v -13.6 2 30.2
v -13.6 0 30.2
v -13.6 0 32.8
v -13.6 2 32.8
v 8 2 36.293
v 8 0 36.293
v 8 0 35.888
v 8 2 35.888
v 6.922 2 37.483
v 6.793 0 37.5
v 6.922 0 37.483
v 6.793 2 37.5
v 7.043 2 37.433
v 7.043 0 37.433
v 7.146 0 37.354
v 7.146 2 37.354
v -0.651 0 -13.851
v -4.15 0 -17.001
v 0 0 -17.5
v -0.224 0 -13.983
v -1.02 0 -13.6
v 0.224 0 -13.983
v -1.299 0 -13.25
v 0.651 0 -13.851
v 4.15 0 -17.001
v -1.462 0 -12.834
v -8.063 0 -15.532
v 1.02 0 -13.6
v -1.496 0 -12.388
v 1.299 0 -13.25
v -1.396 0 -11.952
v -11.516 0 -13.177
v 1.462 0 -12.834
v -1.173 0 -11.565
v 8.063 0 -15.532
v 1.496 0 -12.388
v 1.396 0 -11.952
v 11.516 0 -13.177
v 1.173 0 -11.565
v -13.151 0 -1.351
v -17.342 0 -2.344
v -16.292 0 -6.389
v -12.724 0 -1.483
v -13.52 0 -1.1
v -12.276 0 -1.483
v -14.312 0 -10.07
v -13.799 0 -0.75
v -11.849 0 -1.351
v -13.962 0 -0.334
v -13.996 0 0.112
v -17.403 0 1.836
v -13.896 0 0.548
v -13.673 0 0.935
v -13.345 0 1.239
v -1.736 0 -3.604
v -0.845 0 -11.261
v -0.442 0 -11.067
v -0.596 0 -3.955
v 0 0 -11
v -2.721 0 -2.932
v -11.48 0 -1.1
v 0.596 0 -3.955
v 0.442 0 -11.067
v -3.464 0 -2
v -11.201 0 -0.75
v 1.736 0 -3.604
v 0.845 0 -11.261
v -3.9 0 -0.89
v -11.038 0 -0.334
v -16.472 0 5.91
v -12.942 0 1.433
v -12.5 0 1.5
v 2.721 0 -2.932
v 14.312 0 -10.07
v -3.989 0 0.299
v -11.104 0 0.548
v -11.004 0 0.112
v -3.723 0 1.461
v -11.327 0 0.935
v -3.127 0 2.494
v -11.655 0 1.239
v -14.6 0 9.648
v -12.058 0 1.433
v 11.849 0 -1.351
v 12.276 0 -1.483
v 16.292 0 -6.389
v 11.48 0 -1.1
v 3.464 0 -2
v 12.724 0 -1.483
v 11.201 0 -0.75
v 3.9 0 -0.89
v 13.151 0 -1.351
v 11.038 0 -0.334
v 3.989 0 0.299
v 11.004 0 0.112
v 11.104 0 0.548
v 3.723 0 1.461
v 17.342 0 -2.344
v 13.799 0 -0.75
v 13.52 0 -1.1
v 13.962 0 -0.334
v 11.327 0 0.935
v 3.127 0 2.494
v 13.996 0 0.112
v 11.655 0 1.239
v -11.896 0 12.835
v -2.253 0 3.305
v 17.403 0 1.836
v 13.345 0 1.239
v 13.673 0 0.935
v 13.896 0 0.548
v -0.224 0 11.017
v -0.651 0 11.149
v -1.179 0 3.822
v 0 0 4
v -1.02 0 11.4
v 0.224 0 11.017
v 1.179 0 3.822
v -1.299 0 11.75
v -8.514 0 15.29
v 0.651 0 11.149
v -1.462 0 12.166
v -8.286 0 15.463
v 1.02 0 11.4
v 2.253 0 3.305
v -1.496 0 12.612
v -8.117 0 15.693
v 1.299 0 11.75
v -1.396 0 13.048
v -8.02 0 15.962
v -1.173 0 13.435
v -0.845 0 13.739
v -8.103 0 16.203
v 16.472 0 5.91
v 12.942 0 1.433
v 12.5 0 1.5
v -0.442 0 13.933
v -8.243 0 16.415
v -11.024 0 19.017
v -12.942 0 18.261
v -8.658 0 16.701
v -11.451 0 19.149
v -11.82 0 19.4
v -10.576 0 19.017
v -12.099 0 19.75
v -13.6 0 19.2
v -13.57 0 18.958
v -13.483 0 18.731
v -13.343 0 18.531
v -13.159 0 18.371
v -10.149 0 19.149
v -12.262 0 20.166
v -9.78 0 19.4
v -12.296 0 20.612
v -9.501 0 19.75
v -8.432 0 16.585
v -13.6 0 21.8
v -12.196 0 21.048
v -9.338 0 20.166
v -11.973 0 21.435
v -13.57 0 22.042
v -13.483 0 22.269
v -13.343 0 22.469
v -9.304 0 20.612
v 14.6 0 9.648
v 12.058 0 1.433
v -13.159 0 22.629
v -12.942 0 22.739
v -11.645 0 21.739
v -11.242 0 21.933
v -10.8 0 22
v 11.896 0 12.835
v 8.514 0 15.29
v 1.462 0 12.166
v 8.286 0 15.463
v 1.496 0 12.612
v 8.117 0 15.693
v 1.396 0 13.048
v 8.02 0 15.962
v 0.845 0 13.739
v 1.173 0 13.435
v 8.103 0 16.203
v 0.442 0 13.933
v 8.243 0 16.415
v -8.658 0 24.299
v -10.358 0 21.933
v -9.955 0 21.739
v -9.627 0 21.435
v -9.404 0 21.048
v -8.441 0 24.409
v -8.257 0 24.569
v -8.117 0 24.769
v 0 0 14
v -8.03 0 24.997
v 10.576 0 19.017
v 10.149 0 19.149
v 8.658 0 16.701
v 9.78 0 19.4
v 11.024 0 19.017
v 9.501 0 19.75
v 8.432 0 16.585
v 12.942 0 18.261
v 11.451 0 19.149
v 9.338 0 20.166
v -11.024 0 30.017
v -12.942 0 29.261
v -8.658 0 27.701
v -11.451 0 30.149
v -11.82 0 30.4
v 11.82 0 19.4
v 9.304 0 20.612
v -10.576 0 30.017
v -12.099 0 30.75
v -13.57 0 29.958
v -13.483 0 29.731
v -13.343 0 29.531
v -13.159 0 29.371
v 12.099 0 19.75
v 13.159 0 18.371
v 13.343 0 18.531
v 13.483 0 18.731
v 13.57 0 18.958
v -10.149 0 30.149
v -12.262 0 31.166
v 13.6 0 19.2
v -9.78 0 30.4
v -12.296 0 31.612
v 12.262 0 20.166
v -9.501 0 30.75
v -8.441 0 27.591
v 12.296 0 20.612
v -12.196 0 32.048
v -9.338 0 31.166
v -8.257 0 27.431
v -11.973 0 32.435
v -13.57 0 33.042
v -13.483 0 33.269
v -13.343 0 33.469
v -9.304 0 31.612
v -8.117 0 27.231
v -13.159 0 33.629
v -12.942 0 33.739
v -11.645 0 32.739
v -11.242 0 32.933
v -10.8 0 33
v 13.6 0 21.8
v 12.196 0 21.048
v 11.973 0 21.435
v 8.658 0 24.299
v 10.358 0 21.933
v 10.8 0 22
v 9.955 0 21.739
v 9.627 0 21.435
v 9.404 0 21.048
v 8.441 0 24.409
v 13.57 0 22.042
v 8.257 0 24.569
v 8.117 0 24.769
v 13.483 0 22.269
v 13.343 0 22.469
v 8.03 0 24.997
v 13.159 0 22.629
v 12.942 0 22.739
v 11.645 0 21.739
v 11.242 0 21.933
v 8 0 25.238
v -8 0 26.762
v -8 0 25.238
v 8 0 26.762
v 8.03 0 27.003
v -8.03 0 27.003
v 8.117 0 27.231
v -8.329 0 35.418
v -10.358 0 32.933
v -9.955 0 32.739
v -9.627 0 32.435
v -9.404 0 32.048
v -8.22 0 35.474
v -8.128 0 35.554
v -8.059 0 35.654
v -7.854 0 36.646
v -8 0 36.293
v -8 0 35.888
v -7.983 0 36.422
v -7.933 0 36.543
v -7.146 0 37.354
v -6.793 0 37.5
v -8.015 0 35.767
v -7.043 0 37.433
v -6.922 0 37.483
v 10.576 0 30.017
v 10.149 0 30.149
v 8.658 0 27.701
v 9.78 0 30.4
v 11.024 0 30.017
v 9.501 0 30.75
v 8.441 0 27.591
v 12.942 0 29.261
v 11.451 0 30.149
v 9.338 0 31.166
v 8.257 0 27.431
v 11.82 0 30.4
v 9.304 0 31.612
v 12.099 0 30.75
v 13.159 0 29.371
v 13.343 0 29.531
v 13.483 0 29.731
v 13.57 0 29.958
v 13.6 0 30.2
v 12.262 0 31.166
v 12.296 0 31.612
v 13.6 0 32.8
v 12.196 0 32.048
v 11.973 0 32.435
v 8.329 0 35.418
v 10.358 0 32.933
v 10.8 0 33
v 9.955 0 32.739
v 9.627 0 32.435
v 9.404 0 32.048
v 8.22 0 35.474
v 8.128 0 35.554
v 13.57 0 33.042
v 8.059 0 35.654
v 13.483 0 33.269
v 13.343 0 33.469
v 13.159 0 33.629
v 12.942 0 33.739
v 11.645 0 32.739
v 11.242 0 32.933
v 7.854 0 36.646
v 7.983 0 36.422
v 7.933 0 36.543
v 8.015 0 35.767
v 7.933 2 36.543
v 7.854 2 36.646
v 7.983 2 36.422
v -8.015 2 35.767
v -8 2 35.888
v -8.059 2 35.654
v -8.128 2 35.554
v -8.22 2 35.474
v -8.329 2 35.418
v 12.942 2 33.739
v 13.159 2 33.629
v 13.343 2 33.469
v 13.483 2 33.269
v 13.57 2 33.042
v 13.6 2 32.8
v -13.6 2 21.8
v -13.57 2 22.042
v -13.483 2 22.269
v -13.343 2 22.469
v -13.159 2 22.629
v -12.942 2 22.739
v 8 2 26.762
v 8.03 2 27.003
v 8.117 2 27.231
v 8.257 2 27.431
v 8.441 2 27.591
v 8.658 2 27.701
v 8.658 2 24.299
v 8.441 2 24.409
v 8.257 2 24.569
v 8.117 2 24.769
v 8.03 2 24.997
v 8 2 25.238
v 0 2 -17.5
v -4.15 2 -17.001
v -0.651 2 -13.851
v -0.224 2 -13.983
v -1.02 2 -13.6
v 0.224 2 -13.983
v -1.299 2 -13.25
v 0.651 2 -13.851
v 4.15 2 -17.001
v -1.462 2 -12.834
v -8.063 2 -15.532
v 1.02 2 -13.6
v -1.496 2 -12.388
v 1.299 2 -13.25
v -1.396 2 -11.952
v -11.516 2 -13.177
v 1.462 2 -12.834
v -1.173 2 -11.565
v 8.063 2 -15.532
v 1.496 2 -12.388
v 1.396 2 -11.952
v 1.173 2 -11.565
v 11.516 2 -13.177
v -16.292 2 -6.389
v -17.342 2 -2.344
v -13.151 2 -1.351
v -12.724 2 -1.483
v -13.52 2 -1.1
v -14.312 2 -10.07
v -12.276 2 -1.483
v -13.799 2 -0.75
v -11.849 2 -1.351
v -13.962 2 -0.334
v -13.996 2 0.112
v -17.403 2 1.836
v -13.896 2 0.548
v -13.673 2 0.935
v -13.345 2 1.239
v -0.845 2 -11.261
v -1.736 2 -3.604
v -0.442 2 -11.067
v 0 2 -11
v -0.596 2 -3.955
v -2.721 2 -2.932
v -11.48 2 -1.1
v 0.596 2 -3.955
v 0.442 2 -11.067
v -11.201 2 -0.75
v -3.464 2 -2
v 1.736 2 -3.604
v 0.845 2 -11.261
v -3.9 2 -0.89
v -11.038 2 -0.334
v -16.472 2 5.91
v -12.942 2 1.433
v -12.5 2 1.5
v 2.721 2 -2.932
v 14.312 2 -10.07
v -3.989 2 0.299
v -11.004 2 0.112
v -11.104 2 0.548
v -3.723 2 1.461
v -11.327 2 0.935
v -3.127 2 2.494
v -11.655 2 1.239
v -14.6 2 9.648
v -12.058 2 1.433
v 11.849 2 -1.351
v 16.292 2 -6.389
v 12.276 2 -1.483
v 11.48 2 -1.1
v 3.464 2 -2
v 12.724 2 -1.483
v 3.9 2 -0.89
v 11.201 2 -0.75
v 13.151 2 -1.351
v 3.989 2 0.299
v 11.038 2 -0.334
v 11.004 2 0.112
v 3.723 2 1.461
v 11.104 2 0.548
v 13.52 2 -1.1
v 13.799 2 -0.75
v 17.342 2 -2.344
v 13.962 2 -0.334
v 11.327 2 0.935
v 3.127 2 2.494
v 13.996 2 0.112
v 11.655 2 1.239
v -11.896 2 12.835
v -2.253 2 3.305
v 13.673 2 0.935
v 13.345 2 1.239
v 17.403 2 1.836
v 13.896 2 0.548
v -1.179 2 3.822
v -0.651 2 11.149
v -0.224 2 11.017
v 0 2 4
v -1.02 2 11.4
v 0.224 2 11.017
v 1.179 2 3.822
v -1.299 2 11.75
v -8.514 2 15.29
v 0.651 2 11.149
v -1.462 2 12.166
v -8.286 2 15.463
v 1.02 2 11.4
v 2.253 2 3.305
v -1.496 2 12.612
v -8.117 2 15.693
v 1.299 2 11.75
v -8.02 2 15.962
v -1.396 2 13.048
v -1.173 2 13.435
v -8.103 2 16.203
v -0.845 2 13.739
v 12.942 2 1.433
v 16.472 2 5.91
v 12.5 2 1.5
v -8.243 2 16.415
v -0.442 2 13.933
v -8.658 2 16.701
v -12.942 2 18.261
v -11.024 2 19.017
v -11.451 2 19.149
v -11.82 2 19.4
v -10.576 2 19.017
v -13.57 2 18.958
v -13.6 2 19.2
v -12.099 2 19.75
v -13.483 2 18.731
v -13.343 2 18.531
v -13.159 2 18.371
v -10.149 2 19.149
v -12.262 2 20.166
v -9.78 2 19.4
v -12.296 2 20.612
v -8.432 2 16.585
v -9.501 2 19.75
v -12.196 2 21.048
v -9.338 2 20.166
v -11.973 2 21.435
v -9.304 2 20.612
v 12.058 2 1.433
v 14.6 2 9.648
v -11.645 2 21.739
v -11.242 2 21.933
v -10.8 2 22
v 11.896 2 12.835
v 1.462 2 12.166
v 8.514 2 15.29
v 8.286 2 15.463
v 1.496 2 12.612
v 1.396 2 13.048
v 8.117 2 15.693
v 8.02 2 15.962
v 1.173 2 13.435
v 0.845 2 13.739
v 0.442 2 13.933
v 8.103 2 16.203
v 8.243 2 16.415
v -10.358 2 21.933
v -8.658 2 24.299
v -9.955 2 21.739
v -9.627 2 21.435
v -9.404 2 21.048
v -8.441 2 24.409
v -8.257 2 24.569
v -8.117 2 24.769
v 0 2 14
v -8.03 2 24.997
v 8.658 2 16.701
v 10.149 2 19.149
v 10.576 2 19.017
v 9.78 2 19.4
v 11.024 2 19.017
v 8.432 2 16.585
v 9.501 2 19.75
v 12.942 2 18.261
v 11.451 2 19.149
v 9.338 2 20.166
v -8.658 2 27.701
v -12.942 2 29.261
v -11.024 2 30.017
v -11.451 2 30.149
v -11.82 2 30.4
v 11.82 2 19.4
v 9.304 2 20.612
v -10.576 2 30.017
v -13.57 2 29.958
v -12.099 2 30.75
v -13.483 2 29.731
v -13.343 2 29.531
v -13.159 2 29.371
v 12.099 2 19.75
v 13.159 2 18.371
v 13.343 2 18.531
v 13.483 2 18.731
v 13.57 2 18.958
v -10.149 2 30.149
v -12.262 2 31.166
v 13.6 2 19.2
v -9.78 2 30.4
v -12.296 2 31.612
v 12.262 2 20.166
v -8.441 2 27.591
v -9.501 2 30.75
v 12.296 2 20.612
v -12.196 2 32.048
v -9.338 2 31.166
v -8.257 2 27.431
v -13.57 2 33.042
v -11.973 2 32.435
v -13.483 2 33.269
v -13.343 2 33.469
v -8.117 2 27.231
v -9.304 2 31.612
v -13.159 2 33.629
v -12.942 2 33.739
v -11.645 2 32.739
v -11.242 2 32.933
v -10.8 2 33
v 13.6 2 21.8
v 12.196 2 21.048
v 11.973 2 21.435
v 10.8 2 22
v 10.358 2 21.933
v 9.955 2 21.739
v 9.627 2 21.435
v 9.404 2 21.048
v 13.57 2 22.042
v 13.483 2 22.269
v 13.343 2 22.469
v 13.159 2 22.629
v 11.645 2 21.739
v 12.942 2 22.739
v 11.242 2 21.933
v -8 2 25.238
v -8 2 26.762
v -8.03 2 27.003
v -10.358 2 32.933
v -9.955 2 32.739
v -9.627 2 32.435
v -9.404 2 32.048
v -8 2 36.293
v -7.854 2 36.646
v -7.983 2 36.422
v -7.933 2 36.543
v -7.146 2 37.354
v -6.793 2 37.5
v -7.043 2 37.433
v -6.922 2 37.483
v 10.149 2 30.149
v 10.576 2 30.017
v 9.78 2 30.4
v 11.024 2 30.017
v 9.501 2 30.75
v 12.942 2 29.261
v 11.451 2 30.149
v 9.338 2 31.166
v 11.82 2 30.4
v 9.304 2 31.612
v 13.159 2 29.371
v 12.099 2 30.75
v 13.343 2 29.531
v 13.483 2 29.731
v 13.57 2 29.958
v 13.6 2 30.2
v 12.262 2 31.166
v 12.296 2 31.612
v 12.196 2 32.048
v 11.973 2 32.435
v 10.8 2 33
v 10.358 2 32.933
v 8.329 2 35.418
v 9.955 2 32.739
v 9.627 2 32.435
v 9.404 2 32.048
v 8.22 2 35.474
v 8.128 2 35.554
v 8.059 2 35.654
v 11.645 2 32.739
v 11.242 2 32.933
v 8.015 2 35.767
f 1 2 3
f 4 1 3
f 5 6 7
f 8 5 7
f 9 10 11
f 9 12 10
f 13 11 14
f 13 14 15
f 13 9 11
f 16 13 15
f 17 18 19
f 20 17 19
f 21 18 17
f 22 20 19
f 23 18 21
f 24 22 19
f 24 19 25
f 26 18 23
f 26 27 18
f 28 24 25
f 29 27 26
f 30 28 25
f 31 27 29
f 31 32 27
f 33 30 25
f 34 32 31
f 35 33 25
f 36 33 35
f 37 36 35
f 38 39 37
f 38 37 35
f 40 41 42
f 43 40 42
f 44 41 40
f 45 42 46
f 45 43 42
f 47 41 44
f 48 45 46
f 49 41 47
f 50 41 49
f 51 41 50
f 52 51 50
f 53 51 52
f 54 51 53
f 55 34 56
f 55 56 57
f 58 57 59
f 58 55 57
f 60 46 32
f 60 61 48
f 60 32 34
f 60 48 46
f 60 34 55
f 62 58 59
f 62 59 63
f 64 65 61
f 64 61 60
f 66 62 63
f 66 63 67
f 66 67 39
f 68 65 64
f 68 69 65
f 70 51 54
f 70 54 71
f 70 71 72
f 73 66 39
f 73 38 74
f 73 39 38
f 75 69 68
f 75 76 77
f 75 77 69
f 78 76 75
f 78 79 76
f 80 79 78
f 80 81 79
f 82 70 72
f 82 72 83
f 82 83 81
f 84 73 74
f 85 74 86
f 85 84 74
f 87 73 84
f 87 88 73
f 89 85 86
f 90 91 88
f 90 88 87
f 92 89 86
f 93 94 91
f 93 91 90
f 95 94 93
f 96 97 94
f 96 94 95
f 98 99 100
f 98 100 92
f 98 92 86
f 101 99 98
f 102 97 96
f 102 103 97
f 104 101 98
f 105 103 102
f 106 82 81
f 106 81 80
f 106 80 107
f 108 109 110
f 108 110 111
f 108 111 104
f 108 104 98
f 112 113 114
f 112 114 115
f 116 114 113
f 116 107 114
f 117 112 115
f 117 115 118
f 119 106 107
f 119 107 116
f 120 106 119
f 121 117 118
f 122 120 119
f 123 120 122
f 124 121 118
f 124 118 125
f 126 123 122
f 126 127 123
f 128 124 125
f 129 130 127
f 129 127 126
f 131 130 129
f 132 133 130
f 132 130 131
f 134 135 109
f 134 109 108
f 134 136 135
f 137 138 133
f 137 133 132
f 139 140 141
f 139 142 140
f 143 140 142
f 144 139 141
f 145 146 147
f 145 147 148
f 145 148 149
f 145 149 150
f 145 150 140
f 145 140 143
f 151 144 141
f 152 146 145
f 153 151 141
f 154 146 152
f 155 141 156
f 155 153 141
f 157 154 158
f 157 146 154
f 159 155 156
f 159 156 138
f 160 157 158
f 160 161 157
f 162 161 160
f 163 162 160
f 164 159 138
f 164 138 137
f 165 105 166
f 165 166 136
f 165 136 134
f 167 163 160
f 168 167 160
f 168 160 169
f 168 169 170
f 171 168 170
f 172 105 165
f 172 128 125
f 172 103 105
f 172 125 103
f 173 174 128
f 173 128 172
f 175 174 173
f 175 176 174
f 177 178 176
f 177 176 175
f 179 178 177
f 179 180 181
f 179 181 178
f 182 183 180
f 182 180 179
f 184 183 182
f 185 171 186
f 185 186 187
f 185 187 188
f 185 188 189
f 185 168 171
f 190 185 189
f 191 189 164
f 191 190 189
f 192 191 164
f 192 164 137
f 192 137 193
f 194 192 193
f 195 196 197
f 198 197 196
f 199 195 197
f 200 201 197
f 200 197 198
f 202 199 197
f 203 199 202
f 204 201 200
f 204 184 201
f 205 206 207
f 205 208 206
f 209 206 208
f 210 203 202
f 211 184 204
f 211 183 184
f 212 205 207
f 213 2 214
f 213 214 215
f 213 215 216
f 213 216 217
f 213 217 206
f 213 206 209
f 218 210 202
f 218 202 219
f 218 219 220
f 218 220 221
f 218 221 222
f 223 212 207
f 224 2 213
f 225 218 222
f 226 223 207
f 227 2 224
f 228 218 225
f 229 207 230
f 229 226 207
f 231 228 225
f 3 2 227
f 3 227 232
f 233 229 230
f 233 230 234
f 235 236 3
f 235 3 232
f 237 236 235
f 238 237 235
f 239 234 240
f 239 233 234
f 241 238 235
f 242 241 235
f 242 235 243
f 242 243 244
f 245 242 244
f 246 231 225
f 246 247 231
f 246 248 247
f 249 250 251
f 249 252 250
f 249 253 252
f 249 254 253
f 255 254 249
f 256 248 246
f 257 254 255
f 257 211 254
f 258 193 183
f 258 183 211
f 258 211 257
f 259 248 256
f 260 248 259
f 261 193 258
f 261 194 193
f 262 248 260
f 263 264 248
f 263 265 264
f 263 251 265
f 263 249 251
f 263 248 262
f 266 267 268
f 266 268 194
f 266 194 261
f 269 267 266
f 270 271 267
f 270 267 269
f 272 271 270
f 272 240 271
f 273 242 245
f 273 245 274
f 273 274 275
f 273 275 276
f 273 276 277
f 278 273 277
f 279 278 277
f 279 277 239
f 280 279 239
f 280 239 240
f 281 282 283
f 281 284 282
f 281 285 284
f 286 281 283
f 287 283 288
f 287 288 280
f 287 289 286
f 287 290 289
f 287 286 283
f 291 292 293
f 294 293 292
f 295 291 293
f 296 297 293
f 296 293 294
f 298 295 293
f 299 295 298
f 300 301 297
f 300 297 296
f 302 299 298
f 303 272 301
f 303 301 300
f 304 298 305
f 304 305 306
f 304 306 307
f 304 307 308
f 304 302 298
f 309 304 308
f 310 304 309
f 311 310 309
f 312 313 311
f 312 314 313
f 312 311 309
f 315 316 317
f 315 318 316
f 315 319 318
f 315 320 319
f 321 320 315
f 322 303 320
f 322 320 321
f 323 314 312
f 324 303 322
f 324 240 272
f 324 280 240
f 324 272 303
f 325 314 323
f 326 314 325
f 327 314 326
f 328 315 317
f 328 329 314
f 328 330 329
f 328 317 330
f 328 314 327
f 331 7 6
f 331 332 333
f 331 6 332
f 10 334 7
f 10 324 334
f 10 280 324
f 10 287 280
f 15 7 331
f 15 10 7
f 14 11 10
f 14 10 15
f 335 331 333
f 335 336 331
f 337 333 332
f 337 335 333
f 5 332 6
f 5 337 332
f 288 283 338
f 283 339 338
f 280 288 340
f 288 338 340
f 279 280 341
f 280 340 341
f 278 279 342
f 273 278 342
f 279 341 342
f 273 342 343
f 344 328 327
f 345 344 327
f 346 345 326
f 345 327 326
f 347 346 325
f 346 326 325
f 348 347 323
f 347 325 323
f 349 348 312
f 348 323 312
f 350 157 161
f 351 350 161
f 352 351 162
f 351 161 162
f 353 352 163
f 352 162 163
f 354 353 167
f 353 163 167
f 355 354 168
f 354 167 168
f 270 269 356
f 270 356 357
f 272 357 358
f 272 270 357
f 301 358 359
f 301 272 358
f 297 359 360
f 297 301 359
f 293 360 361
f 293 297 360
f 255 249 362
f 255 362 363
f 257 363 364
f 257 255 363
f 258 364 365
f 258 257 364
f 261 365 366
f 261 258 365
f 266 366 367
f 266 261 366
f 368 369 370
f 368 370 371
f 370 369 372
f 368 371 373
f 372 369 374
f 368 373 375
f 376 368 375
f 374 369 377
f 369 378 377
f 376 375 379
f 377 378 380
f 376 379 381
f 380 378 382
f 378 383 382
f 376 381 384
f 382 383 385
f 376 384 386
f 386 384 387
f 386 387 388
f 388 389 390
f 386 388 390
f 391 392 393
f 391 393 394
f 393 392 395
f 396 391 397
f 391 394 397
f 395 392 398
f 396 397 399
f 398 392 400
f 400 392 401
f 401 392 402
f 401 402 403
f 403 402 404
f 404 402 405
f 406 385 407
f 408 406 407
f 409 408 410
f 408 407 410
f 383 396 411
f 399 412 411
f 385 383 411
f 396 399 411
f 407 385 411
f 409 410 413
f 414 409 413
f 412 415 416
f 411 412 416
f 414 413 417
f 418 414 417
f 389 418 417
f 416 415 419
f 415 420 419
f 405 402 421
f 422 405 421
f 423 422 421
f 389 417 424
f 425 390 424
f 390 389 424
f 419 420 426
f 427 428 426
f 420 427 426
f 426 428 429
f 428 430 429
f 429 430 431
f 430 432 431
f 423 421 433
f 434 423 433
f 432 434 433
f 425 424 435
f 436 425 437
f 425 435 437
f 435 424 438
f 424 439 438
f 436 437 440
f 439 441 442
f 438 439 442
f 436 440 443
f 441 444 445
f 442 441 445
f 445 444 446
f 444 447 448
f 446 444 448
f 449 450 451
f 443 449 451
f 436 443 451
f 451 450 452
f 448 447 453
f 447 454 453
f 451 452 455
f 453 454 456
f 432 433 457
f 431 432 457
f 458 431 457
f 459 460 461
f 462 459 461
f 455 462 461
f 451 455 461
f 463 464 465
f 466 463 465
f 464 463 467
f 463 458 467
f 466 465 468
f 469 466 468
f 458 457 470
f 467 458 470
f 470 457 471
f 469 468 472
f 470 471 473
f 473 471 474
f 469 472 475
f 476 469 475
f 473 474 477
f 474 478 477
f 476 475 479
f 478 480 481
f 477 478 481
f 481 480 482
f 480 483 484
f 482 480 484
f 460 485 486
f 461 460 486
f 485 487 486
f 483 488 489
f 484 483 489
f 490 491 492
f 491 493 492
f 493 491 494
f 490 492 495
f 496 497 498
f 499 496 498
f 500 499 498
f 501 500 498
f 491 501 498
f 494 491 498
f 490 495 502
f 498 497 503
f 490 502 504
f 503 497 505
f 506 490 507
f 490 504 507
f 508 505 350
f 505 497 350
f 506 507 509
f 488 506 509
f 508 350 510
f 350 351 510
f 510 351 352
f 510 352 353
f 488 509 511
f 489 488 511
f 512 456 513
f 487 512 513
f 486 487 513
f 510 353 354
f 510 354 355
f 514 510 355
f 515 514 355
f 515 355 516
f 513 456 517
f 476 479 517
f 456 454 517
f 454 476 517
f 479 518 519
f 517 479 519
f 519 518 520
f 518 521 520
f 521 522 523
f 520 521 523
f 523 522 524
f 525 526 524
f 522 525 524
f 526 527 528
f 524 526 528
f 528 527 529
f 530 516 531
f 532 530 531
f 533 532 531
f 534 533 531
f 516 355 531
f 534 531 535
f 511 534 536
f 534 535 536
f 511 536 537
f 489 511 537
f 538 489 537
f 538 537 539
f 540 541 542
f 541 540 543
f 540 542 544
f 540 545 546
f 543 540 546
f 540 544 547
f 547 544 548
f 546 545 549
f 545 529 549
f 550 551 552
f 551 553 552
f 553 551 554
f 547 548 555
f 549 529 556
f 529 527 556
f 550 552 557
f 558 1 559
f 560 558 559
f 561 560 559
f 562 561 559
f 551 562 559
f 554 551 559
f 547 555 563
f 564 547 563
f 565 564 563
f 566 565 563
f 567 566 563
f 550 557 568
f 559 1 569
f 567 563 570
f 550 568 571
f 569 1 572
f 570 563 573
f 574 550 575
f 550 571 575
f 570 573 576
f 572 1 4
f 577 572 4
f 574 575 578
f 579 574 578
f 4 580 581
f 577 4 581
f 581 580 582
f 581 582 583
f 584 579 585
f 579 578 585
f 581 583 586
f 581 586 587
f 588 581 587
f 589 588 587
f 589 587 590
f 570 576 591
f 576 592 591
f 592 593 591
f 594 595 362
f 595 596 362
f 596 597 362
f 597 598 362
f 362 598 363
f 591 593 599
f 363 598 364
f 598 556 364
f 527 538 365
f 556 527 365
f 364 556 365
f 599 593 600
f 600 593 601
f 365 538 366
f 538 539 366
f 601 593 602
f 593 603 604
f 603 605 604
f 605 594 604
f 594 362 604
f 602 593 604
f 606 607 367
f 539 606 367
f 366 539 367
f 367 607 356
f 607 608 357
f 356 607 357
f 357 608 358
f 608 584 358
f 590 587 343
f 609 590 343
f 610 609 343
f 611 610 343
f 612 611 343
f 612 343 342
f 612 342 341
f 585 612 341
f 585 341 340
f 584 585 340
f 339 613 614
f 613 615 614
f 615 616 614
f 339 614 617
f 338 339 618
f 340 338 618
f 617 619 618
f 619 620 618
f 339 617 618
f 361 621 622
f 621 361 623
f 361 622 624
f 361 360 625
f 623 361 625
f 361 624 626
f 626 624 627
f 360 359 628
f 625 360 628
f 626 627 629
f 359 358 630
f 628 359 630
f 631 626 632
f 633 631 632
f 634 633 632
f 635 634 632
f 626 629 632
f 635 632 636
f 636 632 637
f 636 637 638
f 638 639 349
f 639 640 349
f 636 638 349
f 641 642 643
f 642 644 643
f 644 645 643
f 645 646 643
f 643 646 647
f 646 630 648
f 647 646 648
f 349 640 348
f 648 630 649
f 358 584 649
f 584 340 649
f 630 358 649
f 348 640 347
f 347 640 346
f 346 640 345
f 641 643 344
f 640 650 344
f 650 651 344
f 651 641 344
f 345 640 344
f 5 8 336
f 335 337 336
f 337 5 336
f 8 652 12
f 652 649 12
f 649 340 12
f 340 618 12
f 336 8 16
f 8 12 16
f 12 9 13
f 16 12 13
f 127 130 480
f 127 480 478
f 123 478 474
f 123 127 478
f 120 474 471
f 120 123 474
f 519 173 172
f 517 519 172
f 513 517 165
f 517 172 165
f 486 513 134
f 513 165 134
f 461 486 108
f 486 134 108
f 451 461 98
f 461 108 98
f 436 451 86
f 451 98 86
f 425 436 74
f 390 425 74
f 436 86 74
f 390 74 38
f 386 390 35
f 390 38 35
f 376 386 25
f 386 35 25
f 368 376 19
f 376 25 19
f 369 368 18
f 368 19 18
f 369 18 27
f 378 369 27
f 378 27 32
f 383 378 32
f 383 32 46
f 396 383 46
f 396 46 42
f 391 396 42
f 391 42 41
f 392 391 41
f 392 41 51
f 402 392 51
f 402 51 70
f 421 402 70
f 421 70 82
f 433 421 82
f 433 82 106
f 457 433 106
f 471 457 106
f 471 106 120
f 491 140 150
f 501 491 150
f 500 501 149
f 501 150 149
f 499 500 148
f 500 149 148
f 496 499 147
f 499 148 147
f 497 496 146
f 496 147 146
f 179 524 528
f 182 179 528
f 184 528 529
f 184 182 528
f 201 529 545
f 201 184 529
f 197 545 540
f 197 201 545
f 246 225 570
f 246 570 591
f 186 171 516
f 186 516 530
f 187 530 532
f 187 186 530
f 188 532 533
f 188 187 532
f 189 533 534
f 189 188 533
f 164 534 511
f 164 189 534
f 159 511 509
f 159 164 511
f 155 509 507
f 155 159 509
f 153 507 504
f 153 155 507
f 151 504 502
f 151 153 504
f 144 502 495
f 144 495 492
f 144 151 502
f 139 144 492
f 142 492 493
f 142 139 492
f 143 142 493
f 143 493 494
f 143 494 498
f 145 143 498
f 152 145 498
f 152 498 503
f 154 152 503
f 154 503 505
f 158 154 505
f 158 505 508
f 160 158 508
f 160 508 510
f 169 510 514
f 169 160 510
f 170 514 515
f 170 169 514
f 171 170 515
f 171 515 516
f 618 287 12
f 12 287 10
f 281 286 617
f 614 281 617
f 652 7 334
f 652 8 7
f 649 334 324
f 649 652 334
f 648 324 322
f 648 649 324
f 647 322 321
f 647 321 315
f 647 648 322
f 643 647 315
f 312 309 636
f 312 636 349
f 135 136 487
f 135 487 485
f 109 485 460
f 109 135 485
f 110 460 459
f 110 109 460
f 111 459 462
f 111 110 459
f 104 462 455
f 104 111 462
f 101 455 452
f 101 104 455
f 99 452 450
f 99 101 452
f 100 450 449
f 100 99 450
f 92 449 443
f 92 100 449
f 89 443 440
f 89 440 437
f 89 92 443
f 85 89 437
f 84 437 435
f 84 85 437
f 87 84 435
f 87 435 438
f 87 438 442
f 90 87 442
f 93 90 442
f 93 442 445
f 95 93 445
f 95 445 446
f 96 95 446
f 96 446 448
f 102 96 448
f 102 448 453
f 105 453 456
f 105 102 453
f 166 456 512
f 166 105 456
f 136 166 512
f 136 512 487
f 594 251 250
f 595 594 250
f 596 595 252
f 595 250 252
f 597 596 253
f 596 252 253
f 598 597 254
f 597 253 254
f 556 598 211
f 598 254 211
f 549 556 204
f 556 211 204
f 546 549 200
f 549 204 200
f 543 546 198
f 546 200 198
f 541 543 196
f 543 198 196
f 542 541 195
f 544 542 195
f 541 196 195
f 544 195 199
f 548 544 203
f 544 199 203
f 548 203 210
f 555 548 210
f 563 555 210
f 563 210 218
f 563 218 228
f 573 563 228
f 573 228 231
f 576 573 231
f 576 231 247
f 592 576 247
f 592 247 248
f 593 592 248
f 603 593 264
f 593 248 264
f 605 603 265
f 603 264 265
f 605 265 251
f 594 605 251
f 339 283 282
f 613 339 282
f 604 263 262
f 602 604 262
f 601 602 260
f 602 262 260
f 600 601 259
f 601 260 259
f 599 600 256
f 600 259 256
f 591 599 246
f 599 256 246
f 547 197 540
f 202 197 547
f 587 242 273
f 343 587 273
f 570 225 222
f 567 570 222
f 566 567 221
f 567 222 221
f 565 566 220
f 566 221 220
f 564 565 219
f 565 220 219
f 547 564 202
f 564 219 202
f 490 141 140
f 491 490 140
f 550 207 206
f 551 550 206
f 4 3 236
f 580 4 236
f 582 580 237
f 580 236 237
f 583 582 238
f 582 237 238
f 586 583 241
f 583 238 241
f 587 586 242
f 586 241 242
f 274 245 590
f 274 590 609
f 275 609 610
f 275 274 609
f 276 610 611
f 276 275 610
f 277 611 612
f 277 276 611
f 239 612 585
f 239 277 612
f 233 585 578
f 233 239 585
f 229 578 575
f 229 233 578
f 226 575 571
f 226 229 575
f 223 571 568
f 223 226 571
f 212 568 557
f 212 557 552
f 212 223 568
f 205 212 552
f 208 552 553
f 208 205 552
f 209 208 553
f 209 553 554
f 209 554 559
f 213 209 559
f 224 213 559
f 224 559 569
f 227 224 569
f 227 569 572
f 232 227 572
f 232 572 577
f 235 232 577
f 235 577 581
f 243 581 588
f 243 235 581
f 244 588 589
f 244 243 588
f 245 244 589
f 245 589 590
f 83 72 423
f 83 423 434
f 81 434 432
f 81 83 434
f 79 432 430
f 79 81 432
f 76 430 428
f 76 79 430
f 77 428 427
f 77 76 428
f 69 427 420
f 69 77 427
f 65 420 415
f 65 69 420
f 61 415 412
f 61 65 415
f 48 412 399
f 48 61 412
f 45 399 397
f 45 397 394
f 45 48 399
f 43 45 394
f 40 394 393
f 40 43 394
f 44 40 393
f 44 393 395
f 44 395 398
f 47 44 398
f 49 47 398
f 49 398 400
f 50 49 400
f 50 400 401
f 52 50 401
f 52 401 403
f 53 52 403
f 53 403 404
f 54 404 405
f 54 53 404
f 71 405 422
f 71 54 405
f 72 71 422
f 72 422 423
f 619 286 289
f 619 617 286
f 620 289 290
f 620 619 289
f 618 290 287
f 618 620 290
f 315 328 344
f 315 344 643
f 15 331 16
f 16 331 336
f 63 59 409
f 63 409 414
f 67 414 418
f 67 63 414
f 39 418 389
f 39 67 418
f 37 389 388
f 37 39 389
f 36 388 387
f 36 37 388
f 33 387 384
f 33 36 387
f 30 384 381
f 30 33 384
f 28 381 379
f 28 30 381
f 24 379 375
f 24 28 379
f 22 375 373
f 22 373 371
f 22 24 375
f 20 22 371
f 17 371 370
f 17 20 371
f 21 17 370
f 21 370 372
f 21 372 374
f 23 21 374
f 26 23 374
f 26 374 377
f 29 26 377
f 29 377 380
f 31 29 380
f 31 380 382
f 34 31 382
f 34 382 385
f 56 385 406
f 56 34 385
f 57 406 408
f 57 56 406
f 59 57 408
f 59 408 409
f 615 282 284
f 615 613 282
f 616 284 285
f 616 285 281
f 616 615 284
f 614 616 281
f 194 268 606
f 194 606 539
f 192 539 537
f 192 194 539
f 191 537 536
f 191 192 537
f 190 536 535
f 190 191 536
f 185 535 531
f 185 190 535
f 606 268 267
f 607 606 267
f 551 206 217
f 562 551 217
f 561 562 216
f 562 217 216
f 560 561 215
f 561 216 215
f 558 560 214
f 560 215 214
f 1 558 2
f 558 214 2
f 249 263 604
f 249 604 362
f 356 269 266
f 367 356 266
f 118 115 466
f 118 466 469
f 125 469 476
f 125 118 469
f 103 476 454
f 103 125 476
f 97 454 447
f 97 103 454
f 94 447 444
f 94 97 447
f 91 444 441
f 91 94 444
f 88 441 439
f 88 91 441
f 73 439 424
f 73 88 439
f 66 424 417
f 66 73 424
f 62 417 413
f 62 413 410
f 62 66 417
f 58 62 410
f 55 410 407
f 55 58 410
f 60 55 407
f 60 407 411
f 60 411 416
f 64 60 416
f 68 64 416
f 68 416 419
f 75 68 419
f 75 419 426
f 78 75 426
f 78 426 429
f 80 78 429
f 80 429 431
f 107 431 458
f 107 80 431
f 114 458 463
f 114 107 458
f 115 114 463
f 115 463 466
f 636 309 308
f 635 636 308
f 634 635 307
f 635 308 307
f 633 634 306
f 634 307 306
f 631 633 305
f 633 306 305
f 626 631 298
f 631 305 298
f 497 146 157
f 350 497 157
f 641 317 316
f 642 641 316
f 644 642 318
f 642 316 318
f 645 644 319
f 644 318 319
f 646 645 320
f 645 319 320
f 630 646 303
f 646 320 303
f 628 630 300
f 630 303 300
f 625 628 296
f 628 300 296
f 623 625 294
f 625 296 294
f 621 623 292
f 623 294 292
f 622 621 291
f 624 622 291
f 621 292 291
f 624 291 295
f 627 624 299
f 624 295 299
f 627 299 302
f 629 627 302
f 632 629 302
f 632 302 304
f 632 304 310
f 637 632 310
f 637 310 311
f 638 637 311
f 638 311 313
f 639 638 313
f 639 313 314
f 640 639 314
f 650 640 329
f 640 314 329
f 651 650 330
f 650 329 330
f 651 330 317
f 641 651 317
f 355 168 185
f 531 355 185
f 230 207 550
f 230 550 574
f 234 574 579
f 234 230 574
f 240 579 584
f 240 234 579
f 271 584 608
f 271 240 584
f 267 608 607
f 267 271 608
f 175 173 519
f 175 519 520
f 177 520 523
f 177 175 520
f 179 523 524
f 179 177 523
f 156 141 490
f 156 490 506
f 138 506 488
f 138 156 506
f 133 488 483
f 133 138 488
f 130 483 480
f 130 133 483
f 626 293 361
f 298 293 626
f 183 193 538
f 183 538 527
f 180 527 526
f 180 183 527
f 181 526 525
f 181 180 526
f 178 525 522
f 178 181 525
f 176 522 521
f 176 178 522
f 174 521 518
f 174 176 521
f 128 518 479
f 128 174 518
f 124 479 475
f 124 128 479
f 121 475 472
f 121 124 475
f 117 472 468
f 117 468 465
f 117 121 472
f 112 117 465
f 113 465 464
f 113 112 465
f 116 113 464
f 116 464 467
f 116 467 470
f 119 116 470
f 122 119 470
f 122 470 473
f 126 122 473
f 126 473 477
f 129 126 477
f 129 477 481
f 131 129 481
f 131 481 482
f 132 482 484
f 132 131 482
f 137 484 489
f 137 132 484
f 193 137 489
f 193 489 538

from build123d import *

# Parameters (mm, degrees)
SKETCH1_R           = 17.5
SKETCH1_R_2         = 1.5
SKETCH1_R_3         = 4
BOSS_EXTRUDE1_DEPTH = 2
BOSS_EXTRUDE2_DEPTH = 2
SKETCH3_R           = 1.5
BOSS_EXTRUDE4_DEPTH = 2
FILLET1_R           = 1
CHAMFER1_SIZE       = 1
FILLET2_R           = 0.5


with BuildPart() as part:
    # Sketch1 → Boss-Extrude1 (new body)
    with BuildSketch(Plane(origin=(0, 0, 0), x_dir=(1, 0, 0), z_dir=(0, 1, 0))):
        with Locations(Location((0, 0, 0), (0, 0, 270))):
            Circle(SKETCH1_R)
        with Locations(Location((-12.5, 0, 0), (0, 0, 270))):
            Circle(SKETCH1_R_2, mode=Mode.SUBTRACT)
        with Locations(Location((0, -12.5, 0), (0, 0, 270))):
            Circle(SKETCH1_R_2, mode=Mode.SUBTRACT)
        with Locations(Location((12.5, 0, 0), (0, 0, 270))):
            Circle(SKETCH1_R_2, mode=Mode.SUBTRACT)
        with Locations(Location((0, 12.5, 0), (0, 0, 270))):
            Circle(SKETCH1_R_2, mode=Mode.SUBTRACT)
        with Locations(Location((0, 0, 0), (0, 0, 270))):
            Circle(SKETCH1_R_3, mode=Mode.SUBTRACT)
    extrude(amount=BOSS_EXTRUDE1_DEPTH)

    # Sketch2 → Boss-Extrude2 (add)
    with BuildSketch(Plane(origin=(0, 0, 0), x_dir=(1, 0, 0), z_dir=(0, 1, 0))):
        with BuildLine():
            Line((-8, -37.5), (8, -37.5))
            Line((8, -37.5), (8, -15.564382416))
            ThreePointArc((8, -15.564382416), (0, -17.5), (-8, -15.564382416))
            Line((-8, -15.564382416), (-8, -37.5))
        make_face()
    extrude(amount=BOSS_EXTRUDE2_DEPTH)

    # Sketch3 → Boss-Extrude4 (add)
    # profile 1 of 2: a face of its own
    with BuildSketch(Plane(origin=(0, 0, 0), x_dir=(1, 0, 0), z_dir=(0, 1, 0))):
        Polygon((-13.6, -18.5), (-13.6, -22.5), (-8, -24.538233312), (-8, -16.461766688), align=None)
        with Locations(Location((-10.8, -20.5, 0), (0, 0, 270))):
            Circle(SKETCH3_R, mode=Mode.SUBTRACT)
    # profile 2 of 2: a face of its own
    with BuildSketch(Plane(origin=(0, 0, 0), x_dir=(1, 0, 0), z_dir=(0, 1, 0))):
        Polygon((-13.6, -29.5), (-13.6, -33.5), (-8, -35.538233312), (-8, -27.461766688), align=None)
        with Locations(Location((-10.8, -31.5, 0), (0, 0, 270))):
            Circle(SKETCH3_R, mode=Mode.SUBTRACT)
    boss_extrude4 = extrude(amount=BOSS_EXTRUDE4_DEPTH)

    # Mirror1: Boss-Extrude4 across plane
    add(boss_extrude4.mirror(Plane(origin=(0, 0, 0), x_dir=(0, 0, 1), z_dir=(1, 0, 0))))

    # Fillet1
    # the kernel refuses this fillet: 1 mm, written as the material it adds along each edge
    with BuildSketch(Plane(origin=(8, 0, 15.564382416), x_dir=(0.8816627769698464, 0, -0.4718800140987312), z_dir=(0, 1, 0))) as fillet1_piece_1:
        with BuildLine():
            CenterArc((0.59907863, -0.999861528), FILLET1_R, 90.953507264, 60.89009106)
            Line((-0.282584147, -0.527981514), (0, 0))
            ThreePointArc((0, 0), (0.291218778, -0.002423264), (0.582437557, 0))
        make_face()
    extrude(amount=2)
    with BuildSketch(Plane(origin=(-8, 0, 15.564382416), x_dir=(-0.8816627769698451, 0, -0.4718800140987337), z_dir=(0, 1, 0))) as fillet1_piece_2:
        with BuildLine():
            CenterArc((0.59907863, 0.999861528), FILLET1_R, 208.156401676, 60.89009106)
            Line((-0.282584147, 0.527981514), (0, 0))
            ThreePointArc((0, 0), (0.291218778, 0.002423264), (0.582437557, 0))
        make_face()
    extrude(amount=2)
    with BuildSketch(Plane(origin=(-8, 0, 24.538233312), x_dir=(-0.9396926207859061, 0, -0.342020143325675), z_dir=(0, 1, 0)), Plane(origin=(-8, 0, 16.461766688), x_dir=(0, 0, -1), z_dir=(0, 1, 0)), Plane(origin=(-8, 0, 27.461766688), x_dir=(0, 0, -1), z_dir=(0, 1, 0)), Plane(origin=(8, 0, 24.538233312), x_dir=(0, 0, 1), z_dir=(0, 1, 0))) as fillet1_piece_3:
        with BuildLine():
            CenterArc((FILLET1_R * 0.70020753821, FILLET1_R), FILLET1_R, 200, 70)
            Line((-FILLET1_R * 0.239485082576, FILLET1_R * 0.657979856674), (0, 0))
            Line((0, 0), (FILLET1_R * 0.70020753821, 0))
        make_face()
    extrude(amount=2)
    with BuildSketch(Plane(origin=(8, 0, 16.461766688), x_dir=(0, 0, -1), z_dir=(0, 1, 0)), Plane(origin=(8, 0, 27.461766688), x_dir=(0, 0, -1), z_dir=(0, 1, 0))) as fillet1_piece_4:
        with BuildLine():
            CenterArc((FILLET1_R * 0.70020753821, -FILLET1_R), FILLET1_R, 90, 70)
            Line((-FILLET1_R * 0.239485082576, -FILLET1_R * 0.657979856674), (0, 0))
            Line((0, 0), (FILLET1_R * 0.70020753821, 0))
        make_face()
    extrude(amount=2)
    # the kernel refuses this fillet: 1 mm, written as the material it takes off along each edge
    with BuildSketch(Plane(origin=(-13.6, -1.750518846, 22.5), x_dir=(0, 0, -1), z_dir=(0, 1, 0)), Plane(origin=(-13.6, -1.750518846, 18.5), x_dir=(0.9396926207859061, 0, -0.342020143325675), z_dir=(0, 1, 0)), Plane(origin=(-13.6, -1.750518846, 33.5), x_dir=(0, 0, -1), z_dir=(0, 1, 0)), Plane(origin=(-13.6, -1.750518846, 29.5), x_dir=(0.9396926207859078, 0, -0.3420201433256705), z_dir=(0, 1, 0)), Plane(origin=(13.6, -1.750518846, 18.5), x_dir=(0, 0, 1), z_dir=(0, 1, 0)), Plane(origin=(13.6, -1.750518846, 22.5), x_dir=(-0.9396926207859078, 0, 0.3420201433256705), z_dir=(0, 1, 0)), Plane(origin=(13.6, -1.750518846, 29.5), x_dir=(0, 0, 1), z_dir=(0, 1, 0)), Plane(origin=(13.6, -1.750518846, 33.5), x_dir=(-0.9396926207859061, 0, 0.342020143325675), z_dir=(0, 1, 0))) as fillet1_2_piece_1:
        with BuildLine():
            CenterArc((FILLET1_R * 0.70020753821, -FILLET1_R), FILLET1_R, 90, 70)
            Line((-FILLET1_R * 0.239485082576, -FILLET1_R * 0.657979856674), (0, 0))
            Line((0, 0), (FILLET1_R * 0.70020753821, 0))
        make_face()
    extrude(amount=5.501037691, mode=Mode.SUBTRACT)

    # Chamfer1
    chamfer1_edges = [part.edges().sort_by_distance(p)[0] for p in [
        (-8, 1, 37.5),
        (8, 1, 37.5),
    ]]
    chamfer(chamfer1_edges, length=CHAMFER1_SIZE)

    # Fillet2
    fillet2_edges = [part.edges().sort_by_distance(p)[0] for p in [
        (7, 1, 37.5),
        (-7, 1, 37.5),
        (-8, 1, 36.5),
        (8, 1, 36.5),
        (-8, 1, 35.538233312),
        (8, 1, 35.538233312),
    ]]
    fillet(fillet2_edges, radius=FILLET2_R)


solid = part.part
